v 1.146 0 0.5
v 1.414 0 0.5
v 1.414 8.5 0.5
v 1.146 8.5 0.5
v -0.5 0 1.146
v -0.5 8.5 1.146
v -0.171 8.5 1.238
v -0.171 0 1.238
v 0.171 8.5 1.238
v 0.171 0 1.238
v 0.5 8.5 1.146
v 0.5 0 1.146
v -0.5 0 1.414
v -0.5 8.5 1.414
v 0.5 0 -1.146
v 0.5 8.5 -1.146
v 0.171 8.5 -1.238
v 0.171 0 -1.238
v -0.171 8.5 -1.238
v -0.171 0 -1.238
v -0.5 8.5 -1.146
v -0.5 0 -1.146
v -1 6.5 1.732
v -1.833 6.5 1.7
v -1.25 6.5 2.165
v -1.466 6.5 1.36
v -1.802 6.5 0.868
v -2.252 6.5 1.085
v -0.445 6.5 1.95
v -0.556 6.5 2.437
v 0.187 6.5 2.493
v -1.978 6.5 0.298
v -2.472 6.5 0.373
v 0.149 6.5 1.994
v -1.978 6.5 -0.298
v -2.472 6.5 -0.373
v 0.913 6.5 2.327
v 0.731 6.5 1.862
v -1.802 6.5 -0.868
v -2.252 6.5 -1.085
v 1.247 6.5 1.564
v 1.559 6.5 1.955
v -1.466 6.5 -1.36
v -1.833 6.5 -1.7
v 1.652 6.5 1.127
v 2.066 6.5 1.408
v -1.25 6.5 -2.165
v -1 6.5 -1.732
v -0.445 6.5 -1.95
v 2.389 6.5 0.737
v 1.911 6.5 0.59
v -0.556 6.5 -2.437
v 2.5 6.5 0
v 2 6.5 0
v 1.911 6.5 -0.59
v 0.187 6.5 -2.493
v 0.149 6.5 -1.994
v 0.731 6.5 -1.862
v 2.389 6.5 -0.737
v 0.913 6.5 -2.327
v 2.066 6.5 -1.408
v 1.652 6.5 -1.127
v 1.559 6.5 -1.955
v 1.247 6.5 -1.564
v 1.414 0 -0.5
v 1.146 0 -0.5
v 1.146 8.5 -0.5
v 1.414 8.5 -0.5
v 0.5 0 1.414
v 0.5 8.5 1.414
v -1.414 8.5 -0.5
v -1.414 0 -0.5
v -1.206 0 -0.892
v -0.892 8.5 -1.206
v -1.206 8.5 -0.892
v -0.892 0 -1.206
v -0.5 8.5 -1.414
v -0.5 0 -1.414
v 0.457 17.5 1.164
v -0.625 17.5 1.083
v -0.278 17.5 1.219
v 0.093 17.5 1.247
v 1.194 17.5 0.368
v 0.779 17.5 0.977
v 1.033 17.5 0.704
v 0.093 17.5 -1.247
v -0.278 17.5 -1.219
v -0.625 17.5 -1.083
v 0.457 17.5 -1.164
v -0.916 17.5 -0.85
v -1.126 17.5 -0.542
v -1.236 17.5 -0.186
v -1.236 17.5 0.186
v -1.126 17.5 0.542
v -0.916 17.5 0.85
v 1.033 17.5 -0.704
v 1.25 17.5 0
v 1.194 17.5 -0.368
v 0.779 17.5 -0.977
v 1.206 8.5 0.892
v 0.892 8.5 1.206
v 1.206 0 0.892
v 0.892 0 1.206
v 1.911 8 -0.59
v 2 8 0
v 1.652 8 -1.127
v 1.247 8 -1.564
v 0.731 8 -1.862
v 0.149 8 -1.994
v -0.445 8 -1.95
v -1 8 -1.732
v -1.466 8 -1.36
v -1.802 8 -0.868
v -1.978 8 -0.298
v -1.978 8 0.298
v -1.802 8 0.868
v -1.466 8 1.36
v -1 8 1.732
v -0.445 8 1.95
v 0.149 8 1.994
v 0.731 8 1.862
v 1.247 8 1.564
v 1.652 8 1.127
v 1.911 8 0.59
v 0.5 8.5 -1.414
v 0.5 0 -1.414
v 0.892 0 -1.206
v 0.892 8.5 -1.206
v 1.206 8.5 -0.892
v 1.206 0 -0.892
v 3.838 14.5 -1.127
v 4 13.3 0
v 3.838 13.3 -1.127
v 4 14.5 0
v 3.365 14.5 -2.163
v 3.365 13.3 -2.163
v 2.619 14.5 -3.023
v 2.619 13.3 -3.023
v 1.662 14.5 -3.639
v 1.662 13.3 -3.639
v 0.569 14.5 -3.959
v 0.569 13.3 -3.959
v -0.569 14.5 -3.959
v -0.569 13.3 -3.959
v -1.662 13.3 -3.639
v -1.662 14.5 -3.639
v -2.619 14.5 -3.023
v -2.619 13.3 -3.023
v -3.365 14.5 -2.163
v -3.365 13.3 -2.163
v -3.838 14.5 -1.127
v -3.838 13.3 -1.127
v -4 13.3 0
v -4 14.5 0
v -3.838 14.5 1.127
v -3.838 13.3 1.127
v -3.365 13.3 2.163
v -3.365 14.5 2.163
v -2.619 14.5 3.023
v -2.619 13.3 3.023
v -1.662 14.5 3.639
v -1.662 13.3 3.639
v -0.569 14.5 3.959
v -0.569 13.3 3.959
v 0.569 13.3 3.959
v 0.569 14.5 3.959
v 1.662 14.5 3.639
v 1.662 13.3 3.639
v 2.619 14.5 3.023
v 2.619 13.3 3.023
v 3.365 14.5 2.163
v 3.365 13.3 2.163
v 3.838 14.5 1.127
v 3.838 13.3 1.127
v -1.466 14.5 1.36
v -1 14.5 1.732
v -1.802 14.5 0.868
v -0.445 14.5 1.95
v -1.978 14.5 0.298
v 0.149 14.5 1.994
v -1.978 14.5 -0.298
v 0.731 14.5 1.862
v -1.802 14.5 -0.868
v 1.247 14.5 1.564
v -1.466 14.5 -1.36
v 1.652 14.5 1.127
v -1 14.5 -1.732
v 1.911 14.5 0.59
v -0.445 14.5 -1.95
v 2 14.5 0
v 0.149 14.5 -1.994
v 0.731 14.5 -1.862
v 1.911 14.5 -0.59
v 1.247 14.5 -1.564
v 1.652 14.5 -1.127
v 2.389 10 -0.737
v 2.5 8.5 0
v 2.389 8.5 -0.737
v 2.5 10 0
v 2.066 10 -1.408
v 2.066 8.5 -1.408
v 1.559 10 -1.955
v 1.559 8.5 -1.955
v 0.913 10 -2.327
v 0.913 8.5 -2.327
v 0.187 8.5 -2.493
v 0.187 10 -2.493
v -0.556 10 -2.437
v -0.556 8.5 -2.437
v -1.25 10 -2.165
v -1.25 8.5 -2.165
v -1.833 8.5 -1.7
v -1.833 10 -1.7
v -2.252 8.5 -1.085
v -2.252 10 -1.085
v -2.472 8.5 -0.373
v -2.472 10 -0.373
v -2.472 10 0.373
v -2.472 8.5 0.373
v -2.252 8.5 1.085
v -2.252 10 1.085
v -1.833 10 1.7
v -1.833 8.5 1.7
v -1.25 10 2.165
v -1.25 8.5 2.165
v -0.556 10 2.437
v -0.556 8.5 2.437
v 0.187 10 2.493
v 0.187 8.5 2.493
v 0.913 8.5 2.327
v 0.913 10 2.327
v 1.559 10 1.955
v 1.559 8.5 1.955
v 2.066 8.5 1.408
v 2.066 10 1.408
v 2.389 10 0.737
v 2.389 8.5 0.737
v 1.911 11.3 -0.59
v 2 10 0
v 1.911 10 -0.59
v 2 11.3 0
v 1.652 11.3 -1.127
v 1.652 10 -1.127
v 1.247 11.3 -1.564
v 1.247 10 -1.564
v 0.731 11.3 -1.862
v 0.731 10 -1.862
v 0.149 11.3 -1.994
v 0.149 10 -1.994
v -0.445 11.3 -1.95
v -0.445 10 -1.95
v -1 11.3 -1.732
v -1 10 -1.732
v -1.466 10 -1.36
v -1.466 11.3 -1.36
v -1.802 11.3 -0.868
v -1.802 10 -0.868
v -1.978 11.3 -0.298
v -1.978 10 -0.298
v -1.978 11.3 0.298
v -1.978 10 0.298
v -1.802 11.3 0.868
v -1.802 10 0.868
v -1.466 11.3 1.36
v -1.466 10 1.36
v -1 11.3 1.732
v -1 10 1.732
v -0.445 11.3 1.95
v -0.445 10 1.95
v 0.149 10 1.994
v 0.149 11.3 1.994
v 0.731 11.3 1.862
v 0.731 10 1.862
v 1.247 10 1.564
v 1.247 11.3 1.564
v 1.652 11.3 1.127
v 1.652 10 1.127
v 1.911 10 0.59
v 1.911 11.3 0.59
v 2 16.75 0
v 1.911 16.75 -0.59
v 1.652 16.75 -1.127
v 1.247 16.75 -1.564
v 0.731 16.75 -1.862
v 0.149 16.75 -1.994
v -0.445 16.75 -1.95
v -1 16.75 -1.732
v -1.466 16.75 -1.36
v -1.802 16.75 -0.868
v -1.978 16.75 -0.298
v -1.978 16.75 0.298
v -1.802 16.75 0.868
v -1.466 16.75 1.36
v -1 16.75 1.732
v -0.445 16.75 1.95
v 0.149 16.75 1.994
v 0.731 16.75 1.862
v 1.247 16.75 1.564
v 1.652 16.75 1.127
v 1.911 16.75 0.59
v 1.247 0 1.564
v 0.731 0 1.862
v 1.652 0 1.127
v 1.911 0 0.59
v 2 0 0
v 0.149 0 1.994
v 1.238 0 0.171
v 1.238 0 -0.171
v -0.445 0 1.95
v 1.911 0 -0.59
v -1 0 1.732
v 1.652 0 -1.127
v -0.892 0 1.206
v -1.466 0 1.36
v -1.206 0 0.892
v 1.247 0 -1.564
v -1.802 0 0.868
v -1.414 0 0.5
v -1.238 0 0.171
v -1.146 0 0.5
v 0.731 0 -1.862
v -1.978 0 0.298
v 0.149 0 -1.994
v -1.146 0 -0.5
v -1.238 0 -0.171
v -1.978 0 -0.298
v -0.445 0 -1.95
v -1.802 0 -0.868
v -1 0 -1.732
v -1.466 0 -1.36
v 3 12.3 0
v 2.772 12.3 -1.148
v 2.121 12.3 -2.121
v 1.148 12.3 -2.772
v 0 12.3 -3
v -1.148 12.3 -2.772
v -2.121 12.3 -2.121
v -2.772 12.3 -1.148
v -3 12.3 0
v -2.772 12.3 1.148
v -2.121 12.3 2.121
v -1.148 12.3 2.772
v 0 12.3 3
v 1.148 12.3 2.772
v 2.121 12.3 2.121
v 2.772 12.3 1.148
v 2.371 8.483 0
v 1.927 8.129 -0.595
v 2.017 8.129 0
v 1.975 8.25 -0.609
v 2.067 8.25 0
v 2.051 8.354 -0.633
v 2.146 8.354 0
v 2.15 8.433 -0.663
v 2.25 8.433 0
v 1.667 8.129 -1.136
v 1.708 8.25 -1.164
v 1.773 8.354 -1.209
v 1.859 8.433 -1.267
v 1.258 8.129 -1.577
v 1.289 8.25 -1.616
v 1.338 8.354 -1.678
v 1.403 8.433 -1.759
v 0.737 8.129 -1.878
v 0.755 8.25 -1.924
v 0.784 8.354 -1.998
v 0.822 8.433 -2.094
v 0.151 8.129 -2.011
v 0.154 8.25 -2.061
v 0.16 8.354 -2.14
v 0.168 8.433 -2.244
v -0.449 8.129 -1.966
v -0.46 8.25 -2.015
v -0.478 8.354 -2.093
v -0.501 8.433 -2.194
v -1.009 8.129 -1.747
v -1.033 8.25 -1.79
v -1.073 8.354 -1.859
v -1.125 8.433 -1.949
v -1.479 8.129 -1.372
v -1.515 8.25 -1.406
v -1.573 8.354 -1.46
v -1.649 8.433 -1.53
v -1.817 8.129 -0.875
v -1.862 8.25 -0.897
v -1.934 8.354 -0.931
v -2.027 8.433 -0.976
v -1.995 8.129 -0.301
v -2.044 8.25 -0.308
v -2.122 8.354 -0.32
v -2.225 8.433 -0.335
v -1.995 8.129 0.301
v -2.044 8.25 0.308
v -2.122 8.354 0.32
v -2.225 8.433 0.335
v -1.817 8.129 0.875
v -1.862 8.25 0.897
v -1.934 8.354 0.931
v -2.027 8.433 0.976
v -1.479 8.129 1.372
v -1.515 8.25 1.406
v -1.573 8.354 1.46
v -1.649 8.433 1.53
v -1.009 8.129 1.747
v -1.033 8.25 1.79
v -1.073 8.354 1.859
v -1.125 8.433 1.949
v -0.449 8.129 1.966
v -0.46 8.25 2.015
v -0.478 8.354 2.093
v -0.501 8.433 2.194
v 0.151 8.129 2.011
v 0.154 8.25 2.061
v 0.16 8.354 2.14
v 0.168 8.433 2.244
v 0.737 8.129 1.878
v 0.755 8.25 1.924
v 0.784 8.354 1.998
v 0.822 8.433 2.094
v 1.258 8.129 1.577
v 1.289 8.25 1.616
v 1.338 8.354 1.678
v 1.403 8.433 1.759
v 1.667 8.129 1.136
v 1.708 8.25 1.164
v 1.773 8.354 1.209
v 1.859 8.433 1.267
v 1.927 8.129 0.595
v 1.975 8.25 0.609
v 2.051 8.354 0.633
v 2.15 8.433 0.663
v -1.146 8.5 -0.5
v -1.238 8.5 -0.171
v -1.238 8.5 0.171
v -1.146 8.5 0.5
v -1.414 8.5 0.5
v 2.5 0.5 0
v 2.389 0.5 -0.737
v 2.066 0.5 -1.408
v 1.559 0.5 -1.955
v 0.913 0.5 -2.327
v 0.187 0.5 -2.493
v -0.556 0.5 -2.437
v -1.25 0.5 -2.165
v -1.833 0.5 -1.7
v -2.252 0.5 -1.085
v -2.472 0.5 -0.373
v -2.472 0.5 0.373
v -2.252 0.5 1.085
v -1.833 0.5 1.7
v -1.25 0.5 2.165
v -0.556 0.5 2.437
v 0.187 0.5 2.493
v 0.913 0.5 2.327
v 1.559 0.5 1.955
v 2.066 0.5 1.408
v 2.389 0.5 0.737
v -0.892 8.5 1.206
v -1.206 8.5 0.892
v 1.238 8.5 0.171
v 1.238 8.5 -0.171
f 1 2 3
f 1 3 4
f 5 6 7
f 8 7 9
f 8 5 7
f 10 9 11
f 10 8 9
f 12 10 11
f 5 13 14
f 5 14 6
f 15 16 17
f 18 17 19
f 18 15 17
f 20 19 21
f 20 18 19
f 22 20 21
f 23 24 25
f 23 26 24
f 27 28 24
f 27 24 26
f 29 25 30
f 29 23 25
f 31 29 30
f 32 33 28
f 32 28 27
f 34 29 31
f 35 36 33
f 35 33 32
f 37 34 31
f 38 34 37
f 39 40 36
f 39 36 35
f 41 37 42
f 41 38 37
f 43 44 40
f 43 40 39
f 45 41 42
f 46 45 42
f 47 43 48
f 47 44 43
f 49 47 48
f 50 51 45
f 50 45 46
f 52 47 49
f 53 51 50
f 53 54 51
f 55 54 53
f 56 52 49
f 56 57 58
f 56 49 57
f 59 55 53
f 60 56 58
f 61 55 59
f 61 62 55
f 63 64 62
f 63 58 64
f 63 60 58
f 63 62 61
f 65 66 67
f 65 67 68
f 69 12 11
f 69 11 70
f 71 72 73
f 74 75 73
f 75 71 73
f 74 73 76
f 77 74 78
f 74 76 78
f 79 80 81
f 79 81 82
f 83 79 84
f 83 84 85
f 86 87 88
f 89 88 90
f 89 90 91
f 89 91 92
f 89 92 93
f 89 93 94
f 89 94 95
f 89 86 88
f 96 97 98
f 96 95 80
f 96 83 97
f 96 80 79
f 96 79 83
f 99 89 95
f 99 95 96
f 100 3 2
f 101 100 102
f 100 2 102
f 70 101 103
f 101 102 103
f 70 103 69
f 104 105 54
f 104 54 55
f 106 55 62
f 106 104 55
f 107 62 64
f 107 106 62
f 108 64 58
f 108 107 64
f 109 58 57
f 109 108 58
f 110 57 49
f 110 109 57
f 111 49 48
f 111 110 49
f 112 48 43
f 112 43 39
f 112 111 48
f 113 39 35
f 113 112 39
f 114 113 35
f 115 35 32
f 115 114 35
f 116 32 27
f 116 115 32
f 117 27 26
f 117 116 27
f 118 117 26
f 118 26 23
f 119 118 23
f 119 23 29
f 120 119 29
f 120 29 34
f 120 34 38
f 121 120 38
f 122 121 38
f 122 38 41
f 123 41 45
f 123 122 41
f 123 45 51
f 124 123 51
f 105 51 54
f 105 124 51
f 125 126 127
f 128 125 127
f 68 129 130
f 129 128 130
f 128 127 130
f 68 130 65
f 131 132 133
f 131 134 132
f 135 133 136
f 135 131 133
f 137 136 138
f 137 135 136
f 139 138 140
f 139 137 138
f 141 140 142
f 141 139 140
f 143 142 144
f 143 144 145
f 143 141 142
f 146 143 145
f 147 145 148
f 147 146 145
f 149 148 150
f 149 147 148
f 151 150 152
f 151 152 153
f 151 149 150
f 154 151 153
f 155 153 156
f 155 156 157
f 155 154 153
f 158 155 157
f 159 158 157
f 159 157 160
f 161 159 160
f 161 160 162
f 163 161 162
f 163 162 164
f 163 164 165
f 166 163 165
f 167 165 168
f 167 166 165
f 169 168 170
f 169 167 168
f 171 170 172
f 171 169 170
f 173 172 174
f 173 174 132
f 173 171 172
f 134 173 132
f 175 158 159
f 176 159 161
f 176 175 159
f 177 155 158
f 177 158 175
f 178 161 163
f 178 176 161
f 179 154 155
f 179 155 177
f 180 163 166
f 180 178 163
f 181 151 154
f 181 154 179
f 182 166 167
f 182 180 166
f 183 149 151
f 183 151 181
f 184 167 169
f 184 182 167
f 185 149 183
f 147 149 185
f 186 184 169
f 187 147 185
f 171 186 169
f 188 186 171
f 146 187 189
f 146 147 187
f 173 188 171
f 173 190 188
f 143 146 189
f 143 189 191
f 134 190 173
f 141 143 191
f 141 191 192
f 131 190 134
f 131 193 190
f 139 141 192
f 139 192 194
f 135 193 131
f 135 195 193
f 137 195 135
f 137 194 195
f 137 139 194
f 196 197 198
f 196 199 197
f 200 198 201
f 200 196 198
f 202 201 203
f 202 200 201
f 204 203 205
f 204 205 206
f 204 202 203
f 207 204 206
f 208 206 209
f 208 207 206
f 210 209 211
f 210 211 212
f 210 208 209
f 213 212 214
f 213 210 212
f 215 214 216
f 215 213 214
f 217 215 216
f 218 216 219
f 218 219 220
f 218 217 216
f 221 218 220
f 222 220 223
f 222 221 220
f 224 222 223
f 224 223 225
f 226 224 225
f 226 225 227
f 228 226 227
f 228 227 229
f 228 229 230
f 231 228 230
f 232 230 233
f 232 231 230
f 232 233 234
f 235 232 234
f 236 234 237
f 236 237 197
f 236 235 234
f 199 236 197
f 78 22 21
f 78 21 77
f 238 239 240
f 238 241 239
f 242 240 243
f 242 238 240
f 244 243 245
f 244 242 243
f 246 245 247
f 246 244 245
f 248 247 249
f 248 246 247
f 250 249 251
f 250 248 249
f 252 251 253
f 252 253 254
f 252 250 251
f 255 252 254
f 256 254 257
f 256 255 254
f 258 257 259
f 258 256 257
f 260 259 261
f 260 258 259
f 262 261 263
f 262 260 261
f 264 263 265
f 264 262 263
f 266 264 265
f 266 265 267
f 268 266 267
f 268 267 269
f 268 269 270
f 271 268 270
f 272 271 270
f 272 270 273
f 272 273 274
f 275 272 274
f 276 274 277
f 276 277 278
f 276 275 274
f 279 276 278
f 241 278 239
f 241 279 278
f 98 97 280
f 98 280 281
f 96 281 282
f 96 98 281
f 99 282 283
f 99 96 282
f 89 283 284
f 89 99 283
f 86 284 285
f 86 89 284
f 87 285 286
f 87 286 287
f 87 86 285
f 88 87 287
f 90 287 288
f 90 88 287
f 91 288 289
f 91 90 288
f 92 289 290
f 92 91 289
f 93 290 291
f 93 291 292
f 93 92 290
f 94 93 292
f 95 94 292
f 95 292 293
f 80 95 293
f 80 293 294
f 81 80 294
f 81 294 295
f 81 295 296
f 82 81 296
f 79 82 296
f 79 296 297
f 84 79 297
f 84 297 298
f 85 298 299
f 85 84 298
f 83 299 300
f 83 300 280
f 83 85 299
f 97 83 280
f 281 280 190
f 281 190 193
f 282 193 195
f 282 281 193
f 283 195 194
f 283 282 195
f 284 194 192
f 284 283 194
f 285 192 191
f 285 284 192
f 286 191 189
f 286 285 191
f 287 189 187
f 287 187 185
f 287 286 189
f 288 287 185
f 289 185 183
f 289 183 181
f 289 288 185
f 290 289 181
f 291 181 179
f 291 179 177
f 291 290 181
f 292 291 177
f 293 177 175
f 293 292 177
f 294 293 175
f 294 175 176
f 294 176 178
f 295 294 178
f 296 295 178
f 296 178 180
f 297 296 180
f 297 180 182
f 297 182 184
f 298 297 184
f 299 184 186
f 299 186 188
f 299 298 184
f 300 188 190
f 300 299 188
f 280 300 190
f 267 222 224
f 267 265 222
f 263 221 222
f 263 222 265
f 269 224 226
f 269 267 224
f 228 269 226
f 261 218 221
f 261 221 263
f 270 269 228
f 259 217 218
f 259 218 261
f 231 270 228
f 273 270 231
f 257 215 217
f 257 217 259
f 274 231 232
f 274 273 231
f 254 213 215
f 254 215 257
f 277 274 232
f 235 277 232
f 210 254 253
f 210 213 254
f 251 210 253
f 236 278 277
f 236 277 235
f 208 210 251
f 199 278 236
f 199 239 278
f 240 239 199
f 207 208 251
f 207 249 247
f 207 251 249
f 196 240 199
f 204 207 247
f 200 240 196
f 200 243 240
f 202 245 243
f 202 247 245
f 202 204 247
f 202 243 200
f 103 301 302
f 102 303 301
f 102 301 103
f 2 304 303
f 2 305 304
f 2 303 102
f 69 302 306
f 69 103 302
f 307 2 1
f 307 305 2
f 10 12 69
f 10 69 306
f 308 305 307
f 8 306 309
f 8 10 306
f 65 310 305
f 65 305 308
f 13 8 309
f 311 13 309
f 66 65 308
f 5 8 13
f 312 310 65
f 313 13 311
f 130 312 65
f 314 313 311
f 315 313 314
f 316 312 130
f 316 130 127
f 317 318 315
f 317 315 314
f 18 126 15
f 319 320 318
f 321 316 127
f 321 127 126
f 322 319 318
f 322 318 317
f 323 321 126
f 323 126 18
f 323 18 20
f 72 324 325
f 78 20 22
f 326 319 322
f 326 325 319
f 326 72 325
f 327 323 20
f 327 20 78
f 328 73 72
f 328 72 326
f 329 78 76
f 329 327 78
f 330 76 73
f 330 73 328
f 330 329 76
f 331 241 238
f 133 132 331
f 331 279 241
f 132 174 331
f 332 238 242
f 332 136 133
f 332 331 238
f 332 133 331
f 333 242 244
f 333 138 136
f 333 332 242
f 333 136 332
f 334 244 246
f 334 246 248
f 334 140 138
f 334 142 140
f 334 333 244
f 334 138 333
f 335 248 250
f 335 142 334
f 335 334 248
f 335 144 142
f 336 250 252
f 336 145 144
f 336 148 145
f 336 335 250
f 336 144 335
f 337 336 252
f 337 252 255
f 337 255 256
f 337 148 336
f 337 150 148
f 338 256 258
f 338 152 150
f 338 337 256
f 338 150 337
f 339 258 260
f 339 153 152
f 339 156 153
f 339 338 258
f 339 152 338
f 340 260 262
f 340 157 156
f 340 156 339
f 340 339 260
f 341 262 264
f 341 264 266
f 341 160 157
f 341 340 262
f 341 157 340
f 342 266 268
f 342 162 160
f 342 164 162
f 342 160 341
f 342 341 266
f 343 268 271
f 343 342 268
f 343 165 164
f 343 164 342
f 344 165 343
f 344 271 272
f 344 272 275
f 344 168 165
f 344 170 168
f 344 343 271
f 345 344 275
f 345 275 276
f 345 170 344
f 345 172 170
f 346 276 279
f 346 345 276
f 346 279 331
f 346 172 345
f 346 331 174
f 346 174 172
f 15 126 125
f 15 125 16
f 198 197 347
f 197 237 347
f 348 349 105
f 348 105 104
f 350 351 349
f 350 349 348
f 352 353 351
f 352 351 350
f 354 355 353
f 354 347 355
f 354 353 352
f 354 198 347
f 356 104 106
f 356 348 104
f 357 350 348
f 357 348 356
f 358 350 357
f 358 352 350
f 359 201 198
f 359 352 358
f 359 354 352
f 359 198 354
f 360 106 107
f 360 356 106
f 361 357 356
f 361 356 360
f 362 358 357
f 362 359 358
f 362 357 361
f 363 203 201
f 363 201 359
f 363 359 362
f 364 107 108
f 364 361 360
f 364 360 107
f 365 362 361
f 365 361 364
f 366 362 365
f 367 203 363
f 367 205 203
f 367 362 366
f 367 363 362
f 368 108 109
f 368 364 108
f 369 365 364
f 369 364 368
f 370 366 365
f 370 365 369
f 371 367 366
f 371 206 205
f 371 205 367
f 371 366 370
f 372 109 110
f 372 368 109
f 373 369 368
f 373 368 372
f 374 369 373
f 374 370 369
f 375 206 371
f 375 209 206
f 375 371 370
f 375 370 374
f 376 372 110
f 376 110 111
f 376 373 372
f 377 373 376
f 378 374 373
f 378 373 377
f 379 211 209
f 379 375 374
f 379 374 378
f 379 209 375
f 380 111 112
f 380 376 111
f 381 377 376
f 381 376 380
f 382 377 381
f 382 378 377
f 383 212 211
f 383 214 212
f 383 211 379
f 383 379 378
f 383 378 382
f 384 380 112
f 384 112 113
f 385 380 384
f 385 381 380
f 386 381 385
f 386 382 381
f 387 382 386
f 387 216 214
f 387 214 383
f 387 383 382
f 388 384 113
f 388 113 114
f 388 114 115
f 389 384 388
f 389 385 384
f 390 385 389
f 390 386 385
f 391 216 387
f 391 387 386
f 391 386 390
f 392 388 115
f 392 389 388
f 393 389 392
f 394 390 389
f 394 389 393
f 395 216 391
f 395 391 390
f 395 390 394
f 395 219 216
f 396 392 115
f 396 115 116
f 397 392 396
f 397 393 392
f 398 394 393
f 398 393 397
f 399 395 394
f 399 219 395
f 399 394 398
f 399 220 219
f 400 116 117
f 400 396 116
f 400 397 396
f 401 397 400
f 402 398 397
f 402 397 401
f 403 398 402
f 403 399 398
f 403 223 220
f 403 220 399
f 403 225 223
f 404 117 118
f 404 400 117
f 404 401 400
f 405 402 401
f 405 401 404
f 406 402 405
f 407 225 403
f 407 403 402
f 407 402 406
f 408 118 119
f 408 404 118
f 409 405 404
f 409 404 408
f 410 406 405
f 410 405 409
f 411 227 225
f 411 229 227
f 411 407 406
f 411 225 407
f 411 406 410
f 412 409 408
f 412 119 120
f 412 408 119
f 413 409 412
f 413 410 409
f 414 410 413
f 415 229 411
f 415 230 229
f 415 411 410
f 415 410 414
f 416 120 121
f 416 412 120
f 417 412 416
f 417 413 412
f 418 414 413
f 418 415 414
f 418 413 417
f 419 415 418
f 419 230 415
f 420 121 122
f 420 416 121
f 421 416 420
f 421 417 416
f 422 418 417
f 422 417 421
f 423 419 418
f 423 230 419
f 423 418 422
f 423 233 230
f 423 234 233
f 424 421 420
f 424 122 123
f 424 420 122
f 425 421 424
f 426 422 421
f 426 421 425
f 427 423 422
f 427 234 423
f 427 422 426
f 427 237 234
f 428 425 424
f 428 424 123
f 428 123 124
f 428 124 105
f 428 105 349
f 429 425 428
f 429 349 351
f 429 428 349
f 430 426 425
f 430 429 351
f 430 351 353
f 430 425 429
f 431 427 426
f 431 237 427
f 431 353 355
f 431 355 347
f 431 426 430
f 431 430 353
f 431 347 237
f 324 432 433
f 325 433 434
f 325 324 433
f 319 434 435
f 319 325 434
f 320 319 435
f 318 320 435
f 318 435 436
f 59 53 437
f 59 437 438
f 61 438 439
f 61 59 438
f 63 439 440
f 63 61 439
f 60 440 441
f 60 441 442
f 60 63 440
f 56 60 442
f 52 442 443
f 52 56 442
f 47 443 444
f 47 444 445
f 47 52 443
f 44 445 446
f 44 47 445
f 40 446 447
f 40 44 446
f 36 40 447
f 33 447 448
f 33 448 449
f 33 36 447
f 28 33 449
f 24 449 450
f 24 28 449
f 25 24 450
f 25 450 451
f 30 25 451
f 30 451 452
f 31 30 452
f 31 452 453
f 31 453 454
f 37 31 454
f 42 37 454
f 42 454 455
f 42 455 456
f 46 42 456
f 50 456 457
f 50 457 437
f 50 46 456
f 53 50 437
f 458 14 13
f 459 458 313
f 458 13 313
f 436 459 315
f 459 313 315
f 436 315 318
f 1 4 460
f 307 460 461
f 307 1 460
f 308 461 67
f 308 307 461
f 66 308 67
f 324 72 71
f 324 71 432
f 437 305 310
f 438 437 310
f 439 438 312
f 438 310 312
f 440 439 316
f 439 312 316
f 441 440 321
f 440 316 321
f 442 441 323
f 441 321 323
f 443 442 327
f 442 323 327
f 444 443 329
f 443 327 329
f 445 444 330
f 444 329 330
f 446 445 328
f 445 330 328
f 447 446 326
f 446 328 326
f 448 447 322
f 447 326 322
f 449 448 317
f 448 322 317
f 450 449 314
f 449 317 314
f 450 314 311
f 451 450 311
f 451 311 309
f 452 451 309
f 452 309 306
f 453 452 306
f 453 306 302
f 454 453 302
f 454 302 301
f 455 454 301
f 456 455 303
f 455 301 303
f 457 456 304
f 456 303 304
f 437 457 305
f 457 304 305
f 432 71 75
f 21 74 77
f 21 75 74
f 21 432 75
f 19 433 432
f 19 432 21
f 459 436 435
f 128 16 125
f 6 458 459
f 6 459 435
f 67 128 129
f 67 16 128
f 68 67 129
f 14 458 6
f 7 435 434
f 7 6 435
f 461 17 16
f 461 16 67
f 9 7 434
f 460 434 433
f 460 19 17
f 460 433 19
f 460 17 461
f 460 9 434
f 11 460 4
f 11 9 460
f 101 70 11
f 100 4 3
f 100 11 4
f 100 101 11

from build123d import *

# Parameters (mm, degrees)
FILLET1_R           = 0.5
CHAMFER1_SIZE       = 0.5
CHAMFER2_SIZE       = 0.75
SKETCH4_R           = 1.5
CUT_EXTRUDE2_DEPTH  = 8.5
BOSS_EXTRUDE1_DEPTH = 8.5
CIRPATTERN1_COUNT   = 4


with BuildPart() as part:
    # Sketch1 → Revolve1 (revolve)
    with BuildSketch(Plane.XY):
        Polygon((0, 0), (2.5, 0), (2.5, 6.5), (2, 6.5), (2, 8.5), (2.5, 8.5), (2.5, 10), (2, 10), (2, 11.3), (4, 13.3), (4, 14.5), (2, 14.5), (2, 17.5), (0, 17.5), align=None)
    revolve(axis=Axis((0, -103.420301815, 0), (0, 1, 0)))

    # Fillet1
    fillet1_edges = [part.edges().sort_by_distance(p)[0] for p in [
        (-2, 8.5, 0),
    ]]
    fillet(fillet1_edges, radius=FILLET1_R - 0.0001)  # a hair under: the kernel refuses the full size

    # Chamfer1
    chamfer1_edges = [part.edges().sort_by_distance(p)[0] for p in [
        (-2.5, 0, 0),
    ]]
    chamfer(chamfer1_edges, length=CHAMFER1_SIZE)

    # Chamfer2
    chamfer2_edges = [part.edges().sort_by_distance(p)[0] for p in [
        (-2, 17.5, 0),
    ]]
    chamfer(chamfer2_edges, length=CHAMFER2_SIZE)

    # Sketch4 → Cut-Extrude2 (cut)
    with BuildSketch(Plane.XZ):
        Circle(SKETCH4_R)
    extrude(amount=-CUT_EXTRUDE2_DEPTH, mode=Mode.SUBTRACT)

    # Sketch6 → Boss-Extrude1 (add)
    with BuildSketch(Plane.XZ):
        with BuildLine():
            Line((-0.5, 1.414213562), (-0.5, 1.145643924))
            ThreePointArc((-0.5, 1.145643924), (0, 1.25), (0.5, 1.145643924))
            Line((0.5, 1.145643924), (0.5, 1.414213562))
            ThreePointArc((0.5, 1.414213562), (0, 1.5), (-0.5, 1.414213562))
        make_face()
    boss_extrude1 = extrude(amount=-BOSS_EXTRUDE1_DEPTH)

    # CirPattern1: Boss-Extrude1 ×4 about axis
    cirpattern1_axis = Axis((0, 0, 0), (0, 1, 0))
    for i in range(1, CIRPATTERN1_COUNT):
        add(boss_extrude1.rotate(cirpattern1_axis, i * 360 / CIRPATTERN1_COUNT))


solid = part.part
